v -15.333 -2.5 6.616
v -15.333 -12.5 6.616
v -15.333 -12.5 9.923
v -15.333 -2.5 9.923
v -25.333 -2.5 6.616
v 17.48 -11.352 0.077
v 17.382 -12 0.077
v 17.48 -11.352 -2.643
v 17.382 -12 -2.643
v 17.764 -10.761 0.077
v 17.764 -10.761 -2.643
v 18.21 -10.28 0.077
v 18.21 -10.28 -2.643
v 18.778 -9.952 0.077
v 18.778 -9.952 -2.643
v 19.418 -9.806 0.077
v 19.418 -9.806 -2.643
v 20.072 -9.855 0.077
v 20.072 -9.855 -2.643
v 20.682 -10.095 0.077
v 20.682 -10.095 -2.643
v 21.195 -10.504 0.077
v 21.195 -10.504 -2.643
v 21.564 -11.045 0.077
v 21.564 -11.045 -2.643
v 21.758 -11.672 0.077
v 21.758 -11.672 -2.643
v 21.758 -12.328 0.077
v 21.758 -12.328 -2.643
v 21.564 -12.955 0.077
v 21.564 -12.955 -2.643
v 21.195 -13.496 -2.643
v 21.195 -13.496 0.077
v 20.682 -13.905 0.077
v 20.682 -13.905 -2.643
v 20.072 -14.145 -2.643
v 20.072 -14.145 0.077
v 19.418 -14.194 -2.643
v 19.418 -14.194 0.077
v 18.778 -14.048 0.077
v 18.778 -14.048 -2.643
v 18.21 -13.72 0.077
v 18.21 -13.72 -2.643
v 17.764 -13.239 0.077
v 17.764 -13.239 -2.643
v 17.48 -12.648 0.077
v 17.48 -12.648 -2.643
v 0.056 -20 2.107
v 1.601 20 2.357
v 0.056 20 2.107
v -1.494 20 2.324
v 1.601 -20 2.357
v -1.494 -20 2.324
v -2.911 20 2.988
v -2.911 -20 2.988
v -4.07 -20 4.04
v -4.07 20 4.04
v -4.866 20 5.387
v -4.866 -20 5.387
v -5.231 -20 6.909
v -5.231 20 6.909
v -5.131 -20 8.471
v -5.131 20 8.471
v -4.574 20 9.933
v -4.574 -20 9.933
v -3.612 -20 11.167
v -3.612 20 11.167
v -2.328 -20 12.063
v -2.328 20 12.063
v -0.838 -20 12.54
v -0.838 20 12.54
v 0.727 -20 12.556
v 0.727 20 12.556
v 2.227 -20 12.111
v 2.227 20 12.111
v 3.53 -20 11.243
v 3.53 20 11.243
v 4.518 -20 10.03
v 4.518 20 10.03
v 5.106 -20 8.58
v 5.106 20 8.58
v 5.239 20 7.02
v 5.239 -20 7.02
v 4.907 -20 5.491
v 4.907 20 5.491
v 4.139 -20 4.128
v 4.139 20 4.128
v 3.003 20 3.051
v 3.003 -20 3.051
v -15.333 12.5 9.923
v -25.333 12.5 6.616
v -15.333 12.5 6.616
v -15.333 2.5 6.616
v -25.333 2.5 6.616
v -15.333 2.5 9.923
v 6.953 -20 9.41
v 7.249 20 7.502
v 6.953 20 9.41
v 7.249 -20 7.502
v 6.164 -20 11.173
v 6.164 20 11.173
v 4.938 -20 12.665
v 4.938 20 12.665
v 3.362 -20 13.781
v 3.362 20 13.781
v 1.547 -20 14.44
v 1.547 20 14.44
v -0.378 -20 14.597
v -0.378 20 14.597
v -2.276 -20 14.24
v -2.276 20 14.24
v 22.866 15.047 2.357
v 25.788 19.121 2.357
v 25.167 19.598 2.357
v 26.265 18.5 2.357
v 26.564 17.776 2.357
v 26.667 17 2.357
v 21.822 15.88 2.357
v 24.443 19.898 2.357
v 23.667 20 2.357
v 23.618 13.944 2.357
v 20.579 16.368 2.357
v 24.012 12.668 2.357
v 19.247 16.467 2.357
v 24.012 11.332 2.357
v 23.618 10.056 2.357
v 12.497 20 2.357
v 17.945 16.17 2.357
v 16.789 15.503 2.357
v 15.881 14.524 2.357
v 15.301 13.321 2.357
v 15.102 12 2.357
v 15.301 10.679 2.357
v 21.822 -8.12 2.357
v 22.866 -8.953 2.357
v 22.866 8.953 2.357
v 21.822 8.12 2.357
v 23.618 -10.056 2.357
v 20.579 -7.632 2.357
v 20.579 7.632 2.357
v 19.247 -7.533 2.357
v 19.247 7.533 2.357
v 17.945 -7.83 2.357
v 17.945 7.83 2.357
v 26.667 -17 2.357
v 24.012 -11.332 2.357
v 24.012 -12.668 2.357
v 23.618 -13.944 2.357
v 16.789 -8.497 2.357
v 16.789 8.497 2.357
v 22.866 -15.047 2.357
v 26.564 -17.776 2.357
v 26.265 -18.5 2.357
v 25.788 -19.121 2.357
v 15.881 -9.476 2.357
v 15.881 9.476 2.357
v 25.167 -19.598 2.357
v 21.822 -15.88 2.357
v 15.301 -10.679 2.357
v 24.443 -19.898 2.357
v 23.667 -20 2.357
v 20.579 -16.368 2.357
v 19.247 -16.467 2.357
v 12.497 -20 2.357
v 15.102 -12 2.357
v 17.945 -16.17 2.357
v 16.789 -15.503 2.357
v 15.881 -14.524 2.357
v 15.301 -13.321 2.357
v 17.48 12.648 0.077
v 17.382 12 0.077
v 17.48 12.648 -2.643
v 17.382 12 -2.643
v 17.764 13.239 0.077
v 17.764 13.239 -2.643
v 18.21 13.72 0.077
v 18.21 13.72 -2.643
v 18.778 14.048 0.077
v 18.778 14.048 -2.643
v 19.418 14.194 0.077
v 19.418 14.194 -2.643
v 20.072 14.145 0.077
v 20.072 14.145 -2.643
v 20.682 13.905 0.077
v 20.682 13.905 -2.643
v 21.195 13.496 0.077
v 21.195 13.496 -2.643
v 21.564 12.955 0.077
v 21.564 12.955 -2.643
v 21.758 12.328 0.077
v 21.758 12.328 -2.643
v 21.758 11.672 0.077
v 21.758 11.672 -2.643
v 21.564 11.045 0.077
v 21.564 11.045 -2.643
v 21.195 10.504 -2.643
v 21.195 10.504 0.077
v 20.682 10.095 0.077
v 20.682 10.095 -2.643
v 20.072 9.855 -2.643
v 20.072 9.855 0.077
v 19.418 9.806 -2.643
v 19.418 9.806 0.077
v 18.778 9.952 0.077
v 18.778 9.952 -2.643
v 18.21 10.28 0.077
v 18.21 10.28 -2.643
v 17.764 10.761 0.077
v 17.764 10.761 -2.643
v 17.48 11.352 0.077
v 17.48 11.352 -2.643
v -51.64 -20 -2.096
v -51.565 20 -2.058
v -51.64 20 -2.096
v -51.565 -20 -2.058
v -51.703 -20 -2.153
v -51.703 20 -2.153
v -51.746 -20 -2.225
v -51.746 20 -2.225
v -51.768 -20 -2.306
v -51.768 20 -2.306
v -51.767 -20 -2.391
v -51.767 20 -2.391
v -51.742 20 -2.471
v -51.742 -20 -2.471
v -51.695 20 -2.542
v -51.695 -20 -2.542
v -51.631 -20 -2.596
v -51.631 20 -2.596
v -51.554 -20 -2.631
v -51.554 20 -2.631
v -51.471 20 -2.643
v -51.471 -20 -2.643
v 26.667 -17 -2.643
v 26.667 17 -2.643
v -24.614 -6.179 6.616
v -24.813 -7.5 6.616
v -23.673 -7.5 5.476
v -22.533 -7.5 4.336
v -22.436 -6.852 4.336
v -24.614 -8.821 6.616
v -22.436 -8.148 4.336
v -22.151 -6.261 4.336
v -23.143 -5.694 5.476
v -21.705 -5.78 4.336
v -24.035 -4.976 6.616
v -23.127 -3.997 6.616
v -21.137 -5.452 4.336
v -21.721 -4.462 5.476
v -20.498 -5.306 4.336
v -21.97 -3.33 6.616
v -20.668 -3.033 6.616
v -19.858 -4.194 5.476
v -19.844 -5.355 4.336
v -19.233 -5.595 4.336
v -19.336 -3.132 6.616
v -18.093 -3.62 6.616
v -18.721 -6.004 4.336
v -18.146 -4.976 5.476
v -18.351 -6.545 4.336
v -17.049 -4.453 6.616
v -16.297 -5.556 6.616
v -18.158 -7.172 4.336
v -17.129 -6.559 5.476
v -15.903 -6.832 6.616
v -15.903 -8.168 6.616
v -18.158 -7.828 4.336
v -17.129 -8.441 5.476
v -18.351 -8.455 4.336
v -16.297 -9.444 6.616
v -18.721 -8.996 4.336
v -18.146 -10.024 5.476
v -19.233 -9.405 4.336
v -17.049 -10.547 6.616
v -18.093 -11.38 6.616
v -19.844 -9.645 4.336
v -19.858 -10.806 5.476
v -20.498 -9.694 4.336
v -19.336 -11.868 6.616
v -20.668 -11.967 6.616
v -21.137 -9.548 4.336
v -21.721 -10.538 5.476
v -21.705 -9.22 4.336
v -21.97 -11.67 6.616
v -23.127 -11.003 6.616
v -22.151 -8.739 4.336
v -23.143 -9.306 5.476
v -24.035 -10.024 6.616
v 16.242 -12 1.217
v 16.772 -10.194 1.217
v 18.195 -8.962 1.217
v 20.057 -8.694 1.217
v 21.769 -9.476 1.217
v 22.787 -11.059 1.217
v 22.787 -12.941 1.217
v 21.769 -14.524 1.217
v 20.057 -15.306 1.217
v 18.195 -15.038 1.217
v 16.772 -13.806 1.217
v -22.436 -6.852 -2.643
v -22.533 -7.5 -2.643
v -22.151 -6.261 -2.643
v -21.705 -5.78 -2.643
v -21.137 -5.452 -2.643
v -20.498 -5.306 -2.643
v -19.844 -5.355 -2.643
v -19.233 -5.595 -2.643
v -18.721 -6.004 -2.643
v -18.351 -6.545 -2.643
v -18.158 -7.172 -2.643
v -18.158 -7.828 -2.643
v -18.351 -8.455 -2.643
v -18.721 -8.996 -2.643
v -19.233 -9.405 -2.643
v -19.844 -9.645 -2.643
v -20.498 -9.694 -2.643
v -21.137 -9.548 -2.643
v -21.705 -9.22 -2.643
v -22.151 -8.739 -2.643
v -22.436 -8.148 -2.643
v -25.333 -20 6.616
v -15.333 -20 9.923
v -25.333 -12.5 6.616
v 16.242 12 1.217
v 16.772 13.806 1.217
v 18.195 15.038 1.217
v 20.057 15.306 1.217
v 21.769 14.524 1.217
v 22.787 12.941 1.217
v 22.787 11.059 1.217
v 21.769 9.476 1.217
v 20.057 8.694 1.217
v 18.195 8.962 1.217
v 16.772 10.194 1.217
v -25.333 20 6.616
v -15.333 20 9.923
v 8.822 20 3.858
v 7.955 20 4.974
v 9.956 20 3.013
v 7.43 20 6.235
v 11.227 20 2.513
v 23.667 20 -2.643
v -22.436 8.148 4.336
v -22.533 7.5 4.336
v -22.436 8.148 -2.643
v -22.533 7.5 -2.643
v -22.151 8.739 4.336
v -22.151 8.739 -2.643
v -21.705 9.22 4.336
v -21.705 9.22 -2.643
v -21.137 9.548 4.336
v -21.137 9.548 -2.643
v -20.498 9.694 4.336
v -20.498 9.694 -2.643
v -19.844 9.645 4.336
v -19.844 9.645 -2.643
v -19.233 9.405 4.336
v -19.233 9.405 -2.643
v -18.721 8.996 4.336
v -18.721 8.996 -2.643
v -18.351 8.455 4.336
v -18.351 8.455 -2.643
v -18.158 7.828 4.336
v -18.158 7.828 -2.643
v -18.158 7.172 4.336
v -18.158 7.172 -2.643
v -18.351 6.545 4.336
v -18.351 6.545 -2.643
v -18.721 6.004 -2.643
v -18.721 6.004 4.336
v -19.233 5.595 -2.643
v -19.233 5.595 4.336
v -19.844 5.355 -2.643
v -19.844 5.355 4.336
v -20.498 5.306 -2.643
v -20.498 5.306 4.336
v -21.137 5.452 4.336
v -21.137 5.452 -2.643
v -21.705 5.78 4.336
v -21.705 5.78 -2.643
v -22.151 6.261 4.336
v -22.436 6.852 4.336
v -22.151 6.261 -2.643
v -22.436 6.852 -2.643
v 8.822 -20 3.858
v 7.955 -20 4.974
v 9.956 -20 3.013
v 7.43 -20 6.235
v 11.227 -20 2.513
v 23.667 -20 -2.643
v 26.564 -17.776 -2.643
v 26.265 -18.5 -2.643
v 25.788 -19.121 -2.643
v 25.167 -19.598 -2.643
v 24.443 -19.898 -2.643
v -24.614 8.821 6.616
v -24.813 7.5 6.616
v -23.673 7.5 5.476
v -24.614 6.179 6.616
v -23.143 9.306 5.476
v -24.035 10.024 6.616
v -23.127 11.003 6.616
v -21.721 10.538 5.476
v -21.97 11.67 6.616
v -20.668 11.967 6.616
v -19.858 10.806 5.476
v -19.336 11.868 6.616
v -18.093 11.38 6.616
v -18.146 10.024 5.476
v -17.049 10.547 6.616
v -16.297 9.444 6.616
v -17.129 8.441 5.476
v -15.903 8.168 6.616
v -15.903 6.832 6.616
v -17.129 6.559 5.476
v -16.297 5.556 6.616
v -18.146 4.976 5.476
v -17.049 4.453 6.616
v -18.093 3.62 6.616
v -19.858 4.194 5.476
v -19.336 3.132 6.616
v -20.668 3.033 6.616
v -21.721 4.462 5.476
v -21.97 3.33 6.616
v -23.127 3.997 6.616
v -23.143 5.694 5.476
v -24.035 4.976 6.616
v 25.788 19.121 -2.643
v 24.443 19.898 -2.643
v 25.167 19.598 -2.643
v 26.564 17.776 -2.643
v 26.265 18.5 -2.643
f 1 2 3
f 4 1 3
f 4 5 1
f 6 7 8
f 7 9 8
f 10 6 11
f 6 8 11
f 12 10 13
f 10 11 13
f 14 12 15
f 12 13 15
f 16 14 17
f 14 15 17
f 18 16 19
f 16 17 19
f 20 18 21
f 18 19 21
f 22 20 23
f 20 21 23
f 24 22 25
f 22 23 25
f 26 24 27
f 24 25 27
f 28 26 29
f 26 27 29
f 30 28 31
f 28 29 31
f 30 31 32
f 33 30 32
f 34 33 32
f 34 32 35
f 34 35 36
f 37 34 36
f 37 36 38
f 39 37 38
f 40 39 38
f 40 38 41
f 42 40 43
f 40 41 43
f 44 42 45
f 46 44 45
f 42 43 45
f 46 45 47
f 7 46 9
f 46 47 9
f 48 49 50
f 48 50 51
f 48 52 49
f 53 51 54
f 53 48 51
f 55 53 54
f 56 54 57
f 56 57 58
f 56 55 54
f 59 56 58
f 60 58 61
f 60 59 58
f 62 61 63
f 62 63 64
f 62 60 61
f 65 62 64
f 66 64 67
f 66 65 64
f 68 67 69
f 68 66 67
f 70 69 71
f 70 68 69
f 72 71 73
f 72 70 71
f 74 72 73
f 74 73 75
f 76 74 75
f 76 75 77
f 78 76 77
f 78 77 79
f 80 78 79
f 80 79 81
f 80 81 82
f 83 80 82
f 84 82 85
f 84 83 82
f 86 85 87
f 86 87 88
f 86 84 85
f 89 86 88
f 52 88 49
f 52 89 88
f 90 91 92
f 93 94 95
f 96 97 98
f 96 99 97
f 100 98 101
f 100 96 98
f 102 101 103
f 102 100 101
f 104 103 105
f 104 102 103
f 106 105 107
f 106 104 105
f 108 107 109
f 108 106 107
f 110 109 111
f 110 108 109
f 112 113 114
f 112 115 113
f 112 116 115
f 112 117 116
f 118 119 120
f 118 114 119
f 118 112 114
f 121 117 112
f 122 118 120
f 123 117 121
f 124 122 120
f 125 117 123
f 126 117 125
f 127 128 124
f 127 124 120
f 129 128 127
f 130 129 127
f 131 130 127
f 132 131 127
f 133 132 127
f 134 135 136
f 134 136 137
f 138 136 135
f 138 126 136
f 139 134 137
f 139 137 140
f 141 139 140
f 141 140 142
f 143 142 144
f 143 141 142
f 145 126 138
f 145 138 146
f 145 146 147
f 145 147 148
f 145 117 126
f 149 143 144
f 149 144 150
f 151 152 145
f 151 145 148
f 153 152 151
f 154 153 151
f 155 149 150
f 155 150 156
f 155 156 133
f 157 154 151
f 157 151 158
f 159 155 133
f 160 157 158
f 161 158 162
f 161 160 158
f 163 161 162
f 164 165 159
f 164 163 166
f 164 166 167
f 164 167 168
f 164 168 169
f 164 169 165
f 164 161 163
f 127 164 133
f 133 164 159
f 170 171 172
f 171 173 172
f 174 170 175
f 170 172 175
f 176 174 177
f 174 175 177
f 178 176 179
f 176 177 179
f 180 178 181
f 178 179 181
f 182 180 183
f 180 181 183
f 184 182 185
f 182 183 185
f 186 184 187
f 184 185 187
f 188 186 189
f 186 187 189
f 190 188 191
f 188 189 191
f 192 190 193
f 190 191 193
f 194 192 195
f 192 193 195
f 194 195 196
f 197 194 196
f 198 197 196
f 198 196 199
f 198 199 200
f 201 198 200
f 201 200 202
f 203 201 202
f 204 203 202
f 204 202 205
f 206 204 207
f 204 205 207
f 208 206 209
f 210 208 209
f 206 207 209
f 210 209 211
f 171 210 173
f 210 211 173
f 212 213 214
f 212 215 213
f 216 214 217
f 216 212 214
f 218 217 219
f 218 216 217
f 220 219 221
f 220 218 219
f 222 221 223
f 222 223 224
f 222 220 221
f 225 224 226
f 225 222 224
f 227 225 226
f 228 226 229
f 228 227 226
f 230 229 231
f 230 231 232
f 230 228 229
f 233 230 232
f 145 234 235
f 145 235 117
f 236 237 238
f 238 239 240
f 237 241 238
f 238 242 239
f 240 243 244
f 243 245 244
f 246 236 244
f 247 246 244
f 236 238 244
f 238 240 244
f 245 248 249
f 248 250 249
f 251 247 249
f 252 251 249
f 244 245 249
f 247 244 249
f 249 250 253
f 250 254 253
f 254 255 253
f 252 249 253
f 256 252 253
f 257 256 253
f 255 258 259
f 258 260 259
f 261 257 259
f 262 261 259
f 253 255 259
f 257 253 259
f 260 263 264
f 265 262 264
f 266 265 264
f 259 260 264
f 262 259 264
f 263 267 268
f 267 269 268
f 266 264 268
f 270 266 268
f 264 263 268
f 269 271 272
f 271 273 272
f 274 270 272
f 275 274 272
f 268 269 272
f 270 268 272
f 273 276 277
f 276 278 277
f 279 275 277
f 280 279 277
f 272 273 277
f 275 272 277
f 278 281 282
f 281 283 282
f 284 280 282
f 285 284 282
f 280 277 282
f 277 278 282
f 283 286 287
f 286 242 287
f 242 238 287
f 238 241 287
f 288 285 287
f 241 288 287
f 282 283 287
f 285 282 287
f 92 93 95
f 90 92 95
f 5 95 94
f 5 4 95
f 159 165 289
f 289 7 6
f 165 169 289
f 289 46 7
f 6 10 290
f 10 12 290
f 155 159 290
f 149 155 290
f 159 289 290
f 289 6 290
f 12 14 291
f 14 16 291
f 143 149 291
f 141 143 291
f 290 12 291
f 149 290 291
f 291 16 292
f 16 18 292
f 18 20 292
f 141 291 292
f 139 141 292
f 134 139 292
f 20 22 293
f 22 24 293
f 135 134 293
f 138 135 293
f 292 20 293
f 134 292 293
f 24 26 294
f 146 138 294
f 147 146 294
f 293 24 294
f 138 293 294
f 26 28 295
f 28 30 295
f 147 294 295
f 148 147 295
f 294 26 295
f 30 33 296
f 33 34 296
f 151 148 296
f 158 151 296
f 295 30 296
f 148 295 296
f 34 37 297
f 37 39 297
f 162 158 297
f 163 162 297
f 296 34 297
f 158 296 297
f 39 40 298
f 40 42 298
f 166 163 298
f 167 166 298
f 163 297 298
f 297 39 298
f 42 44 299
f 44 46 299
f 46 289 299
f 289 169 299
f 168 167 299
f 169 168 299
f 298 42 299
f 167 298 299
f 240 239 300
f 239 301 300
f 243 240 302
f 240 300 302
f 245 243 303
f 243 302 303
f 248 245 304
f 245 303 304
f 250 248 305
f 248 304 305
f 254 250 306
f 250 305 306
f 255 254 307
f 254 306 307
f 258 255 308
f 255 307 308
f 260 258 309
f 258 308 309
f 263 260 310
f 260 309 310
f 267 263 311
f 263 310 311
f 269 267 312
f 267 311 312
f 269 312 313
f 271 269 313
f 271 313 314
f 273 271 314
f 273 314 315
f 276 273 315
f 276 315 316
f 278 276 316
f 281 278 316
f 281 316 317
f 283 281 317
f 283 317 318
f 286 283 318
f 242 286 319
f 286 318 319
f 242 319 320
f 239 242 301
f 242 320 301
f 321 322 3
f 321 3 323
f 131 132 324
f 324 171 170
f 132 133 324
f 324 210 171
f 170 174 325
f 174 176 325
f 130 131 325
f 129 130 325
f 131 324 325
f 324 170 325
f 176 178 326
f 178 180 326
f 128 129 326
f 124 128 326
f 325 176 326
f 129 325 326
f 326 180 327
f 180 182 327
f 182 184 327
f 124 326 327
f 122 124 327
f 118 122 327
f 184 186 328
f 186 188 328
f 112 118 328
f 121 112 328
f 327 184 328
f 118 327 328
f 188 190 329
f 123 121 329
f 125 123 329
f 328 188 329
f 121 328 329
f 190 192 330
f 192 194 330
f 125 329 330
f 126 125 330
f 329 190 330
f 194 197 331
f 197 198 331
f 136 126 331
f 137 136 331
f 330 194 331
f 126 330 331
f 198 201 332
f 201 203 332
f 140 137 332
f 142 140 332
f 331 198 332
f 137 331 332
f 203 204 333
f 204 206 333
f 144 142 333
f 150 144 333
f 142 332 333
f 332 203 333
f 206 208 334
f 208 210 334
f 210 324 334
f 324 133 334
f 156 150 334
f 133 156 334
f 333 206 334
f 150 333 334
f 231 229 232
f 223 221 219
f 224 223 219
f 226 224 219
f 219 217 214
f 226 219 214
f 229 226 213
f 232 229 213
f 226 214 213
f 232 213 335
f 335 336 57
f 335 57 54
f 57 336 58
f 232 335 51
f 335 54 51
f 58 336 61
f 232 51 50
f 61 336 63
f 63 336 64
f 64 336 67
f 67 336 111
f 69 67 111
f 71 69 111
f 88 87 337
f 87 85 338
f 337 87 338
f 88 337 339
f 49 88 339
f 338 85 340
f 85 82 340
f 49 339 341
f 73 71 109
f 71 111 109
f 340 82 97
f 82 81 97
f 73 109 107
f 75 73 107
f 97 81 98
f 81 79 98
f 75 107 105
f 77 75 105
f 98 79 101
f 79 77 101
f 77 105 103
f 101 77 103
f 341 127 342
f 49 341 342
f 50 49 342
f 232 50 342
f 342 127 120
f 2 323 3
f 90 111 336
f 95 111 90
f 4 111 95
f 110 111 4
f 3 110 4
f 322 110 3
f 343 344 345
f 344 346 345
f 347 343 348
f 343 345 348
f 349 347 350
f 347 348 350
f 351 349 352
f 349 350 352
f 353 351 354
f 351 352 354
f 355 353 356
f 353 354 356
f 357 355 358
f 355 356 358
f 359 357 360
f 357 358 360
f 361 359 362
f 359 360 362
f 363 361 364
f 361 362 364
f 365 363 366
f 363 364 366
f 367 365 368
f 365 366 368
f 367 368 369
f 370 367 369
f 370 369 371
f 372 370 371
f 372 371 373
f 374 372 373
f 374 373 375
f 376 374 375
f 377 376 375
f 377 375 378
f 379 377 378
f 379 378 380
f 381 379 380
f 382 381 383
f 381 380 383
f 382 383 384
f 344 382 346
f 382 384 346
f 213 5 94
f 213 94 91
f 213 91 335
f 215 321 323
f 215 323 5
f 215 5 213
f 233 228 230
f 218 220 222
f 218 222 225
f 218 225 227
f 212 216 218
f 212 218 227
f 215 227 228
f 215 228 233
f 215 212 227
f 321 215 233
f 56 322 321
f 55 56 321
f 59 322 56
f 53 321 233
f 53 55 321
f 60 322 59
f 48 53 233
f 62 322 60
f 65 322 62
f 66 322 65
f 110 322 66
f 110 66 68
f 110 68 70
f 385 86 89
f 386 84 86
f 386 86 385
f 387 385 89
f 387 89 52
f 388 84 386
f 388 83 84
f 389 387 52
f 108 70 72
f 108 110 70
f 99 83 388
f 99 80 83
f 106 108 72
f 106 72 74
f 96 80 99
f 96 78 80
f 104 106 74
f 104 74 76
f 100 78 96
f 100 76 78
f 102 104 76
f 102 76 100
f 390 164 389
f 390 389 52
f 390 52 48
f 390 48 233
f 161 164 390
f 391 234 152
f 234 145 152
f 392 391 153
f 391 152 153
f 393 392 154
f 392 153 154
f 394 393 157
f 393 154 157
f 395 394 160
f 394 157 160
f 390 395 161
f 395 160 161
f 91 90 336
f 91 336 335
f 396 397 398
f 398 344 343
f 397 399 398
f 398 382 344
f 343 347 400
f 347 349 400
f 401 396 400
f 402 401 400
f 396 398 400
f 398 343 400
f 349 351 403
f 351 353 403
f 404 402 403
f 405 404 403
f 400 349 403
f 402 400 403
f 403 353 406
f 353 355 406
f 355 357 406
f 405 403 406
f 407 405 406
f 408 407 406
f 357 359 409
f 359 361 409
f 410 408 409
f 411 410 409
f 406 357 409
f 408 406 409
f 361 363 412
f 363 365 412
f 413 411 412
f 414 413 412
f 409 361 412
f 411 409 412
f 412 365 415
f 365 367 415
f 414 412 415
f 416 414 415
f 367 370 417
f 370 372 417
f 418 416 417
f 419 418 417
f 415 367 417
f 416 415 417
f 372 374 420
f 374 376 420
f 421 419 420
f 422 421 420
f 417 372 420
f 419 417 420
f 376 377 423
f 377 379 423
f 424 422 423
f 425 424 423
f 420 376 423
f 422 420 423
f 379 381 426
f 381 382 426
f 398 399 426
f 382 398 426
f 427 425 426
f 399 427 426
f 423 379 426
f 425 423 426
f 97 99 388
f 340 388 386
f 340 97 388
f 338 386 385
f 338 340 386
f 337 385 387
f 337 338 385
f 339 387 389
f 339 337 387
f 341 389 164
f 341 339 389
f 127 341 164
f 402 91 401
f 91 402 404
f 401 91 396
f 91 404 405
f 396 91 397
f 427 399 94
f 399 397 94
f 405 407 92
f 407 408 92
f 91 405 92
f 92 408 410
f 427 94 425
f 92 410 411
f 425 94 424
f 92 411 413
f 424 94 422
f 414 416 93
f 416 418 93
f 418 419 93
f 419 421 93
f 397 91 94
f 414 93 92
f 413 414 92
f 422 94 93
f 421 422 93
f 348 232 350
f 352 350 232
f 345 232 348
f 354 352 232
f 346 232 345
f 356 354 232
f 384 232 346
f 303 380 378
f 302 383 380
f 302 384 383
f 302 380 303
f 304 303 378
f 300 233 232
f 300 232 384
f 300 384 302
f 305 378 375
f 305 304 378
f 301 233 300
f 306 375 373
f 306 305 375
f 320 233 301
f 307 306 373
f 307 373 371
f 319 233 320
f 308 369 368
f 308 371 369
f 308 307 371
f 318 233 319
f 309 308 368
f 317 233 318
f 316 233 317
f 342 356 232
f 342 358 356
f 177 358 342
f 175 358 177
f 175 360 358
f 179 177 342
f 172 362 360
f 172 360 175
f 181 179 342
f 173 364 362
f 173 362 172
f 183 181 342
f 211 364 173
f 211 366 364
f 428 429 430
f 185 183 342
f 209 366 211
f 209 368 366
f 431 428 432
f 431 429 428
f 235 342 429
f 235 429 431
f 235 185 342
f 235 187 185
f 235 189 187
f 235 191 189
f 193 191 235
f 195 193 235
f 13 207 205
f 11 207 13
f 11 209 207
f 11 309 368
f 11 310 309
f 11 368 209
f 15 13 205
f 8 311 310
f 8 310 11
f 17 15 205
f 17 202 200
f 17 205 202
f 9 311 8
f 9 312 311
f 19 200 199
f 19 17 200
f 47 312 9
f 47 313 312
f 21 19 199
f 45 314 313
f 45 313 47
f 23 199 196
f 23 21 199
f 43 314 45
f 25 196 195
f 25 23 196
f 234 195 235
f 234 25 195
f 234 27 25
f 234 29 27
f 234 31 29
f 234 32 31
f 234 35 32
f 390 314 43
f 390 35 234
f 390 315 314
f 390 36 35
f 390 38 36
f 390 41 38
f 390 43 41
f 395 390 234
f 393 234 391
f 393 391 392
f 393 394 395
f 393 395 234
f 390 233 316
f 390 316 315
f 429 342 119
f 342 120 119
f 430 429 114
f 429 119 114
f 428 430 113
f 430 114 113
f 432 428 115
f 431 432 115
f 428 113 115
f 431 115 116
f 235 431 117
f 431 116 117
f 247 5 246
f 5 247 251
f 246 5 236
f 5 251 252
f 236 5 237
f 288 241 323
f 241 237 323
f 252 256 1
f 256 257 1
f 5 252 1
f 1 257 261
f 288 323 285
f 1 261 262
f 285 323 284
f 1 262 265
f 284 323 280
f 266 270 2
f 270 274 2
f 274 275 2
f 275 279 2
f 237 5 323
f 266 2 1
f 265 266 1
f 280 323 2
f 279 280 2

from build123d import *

# Parameters (mm, degrees)
F3_DEPTH        = 20
F4_R            = 5.25
F5_R            = 0.3
F7_D            = 4.4
F7_CSINK_D      = 8.96
F7_CSINK_ANGLE  = 90
F8_DEPTH        = 12.5
F10_D           = 4.4
F10_CSINK_D     = 8.96
F10_CSINK_ANGLE = 90
F11_DEPTH       = 2.5
F12_R           = 3


with BuildPart() as f3:
    # F2 (on Front) → F3 (new body, symmetric)
    with BuildSketch(Plane.XZ):
        with BuildLine():
            ThreePointArc((-2.276188083, 14.2404423798), (-6.1249331198, 3.4778868396), (5.25, 2.357022604))
            ThreePointArc((5.25, 2.357022604), (6.7314560089, 4.6644402004), (7.25, 7.357022604))
            ThreePointArc((7.25, 7.357022604), (4.2461827798, 13.2334527959), (-2.276188083, 14.2404423798))
        make_face()
        with BuildLine():
            ThreePointArc((5.25, 7.357022604), (4.2406721496, 4.261994378), (1.6007810594, 2.357022604))
            ThreePointArc((1.6007810594, 2.357022604), (-4.2406721496, 10.4520508299), (5.25, 7.357022604))
        make_face(mode=Mode.SUBTRACT)
        with BuildLine():
            Line((26.6666666667, -2.642977396), (26.6666666667, 2.357022604))
            Line((26.6666666667, 2.357022604), (7.25, 2.357022604))
            Line((7.25, 2.357022604), (5.25, 2.357022604))
            ThreePointArc((5.25, 2.357022604), (-6.1249331198, 3.4778868396), (-2.276188083, 14.2404423798))
            Line((-2.276188083, 14.2404423798), (-15.3333333333, 9.9227457429))
            Line((-15.3333333333, 9.9227457429), (-15.3333333333, 6.6159764958))
            Line((-15.3333333333, 6.6159764958), (-25.3333333333, 6.6159764958))
            Line((-25.3333333333, 6.6159764958), (-25.3333333333, -2.642977396))
            Line((-25.3333333333, -2.642977396), (26.6666666667, -2.642977396))
        make_face()
        Polygon((-53.3333333333, -2.642977396), (-25.3333333333, -2.642977396), (-25.3333333333, 6.6159764958), align=None)
        Polygon((-15.3333333333, 9.9227457429), (-25.3333333333, 6.6159764958), (-15.3333333333, 6.6159764958), align=None)
    extrude(amount=F3_DEPTH, both=True)

    # F4
    f4_edges = [f3.edges().sort_by_distance(p)[0] for p in [
        (5.25, 0, 2.357023),
    ]]
    fillet(f4_edges, radius=F4_R)

    # F5
    f5_edges = [f3.edges().sort_by_distance(p)[0] for p in [
        (-53.333333, 0, -2.642977),
    ]]
    fillet(f5_edges, radius=F5_R)

    # F7 (through all)
    with Locations(Plane.XY.offset(2.357022604)):
        with Locations((19.5820832083, 12), (19.5820832083, -12)):
            CounterSinkHole(F7_D / 2, F7_CSINK_D / 2, counter_sink_angle=F7_CSINK_ANGLE)

    # F2 (on Front) → F8 (cut, symmetric)
    with BuildSketch(Plane.XZ):
        Polygon((-15.3333333333, 9.9227457429), (-25.3333333333, 6.6159764958), (-15.3333333333, 6.6159764958), align=None)
    extrude(amount=F8_DEPTH, both=True, mode=Mode.SUBTRACT)

    # F10 (through all)
    with Locations(Plane.XY.offset(6.6159764958)):
        with Locations((-20.3333333333, -7.5), (-20.3333333333, 7.5)):
            CounterSinkHole(F10_D / 2, F10_CSINK_D / 2, counter_sink_angle=F10_CSINK_ANGLE)

    # F2 (on Front) → F11 (join, symmetric)
    with BuildSketch(Plane.XZ):
        Polygon((-15.3333333333, 9.9227457429), (-25.3333333333, 6.6159764958), (-15.3333333333, 6.6159764958), align=None)
    extrude(amount=F11_DEPTH, both=True)

    # F12
    f12_edges = [f3.edges().sort_by_distance(p)[0] for p in [
        (26.666667, -20, -0.142977),
        (26.666667, 20, -0.142977),
    ]]
    fillet(f12_edges, radius=F12_R)


solid = f3.part
